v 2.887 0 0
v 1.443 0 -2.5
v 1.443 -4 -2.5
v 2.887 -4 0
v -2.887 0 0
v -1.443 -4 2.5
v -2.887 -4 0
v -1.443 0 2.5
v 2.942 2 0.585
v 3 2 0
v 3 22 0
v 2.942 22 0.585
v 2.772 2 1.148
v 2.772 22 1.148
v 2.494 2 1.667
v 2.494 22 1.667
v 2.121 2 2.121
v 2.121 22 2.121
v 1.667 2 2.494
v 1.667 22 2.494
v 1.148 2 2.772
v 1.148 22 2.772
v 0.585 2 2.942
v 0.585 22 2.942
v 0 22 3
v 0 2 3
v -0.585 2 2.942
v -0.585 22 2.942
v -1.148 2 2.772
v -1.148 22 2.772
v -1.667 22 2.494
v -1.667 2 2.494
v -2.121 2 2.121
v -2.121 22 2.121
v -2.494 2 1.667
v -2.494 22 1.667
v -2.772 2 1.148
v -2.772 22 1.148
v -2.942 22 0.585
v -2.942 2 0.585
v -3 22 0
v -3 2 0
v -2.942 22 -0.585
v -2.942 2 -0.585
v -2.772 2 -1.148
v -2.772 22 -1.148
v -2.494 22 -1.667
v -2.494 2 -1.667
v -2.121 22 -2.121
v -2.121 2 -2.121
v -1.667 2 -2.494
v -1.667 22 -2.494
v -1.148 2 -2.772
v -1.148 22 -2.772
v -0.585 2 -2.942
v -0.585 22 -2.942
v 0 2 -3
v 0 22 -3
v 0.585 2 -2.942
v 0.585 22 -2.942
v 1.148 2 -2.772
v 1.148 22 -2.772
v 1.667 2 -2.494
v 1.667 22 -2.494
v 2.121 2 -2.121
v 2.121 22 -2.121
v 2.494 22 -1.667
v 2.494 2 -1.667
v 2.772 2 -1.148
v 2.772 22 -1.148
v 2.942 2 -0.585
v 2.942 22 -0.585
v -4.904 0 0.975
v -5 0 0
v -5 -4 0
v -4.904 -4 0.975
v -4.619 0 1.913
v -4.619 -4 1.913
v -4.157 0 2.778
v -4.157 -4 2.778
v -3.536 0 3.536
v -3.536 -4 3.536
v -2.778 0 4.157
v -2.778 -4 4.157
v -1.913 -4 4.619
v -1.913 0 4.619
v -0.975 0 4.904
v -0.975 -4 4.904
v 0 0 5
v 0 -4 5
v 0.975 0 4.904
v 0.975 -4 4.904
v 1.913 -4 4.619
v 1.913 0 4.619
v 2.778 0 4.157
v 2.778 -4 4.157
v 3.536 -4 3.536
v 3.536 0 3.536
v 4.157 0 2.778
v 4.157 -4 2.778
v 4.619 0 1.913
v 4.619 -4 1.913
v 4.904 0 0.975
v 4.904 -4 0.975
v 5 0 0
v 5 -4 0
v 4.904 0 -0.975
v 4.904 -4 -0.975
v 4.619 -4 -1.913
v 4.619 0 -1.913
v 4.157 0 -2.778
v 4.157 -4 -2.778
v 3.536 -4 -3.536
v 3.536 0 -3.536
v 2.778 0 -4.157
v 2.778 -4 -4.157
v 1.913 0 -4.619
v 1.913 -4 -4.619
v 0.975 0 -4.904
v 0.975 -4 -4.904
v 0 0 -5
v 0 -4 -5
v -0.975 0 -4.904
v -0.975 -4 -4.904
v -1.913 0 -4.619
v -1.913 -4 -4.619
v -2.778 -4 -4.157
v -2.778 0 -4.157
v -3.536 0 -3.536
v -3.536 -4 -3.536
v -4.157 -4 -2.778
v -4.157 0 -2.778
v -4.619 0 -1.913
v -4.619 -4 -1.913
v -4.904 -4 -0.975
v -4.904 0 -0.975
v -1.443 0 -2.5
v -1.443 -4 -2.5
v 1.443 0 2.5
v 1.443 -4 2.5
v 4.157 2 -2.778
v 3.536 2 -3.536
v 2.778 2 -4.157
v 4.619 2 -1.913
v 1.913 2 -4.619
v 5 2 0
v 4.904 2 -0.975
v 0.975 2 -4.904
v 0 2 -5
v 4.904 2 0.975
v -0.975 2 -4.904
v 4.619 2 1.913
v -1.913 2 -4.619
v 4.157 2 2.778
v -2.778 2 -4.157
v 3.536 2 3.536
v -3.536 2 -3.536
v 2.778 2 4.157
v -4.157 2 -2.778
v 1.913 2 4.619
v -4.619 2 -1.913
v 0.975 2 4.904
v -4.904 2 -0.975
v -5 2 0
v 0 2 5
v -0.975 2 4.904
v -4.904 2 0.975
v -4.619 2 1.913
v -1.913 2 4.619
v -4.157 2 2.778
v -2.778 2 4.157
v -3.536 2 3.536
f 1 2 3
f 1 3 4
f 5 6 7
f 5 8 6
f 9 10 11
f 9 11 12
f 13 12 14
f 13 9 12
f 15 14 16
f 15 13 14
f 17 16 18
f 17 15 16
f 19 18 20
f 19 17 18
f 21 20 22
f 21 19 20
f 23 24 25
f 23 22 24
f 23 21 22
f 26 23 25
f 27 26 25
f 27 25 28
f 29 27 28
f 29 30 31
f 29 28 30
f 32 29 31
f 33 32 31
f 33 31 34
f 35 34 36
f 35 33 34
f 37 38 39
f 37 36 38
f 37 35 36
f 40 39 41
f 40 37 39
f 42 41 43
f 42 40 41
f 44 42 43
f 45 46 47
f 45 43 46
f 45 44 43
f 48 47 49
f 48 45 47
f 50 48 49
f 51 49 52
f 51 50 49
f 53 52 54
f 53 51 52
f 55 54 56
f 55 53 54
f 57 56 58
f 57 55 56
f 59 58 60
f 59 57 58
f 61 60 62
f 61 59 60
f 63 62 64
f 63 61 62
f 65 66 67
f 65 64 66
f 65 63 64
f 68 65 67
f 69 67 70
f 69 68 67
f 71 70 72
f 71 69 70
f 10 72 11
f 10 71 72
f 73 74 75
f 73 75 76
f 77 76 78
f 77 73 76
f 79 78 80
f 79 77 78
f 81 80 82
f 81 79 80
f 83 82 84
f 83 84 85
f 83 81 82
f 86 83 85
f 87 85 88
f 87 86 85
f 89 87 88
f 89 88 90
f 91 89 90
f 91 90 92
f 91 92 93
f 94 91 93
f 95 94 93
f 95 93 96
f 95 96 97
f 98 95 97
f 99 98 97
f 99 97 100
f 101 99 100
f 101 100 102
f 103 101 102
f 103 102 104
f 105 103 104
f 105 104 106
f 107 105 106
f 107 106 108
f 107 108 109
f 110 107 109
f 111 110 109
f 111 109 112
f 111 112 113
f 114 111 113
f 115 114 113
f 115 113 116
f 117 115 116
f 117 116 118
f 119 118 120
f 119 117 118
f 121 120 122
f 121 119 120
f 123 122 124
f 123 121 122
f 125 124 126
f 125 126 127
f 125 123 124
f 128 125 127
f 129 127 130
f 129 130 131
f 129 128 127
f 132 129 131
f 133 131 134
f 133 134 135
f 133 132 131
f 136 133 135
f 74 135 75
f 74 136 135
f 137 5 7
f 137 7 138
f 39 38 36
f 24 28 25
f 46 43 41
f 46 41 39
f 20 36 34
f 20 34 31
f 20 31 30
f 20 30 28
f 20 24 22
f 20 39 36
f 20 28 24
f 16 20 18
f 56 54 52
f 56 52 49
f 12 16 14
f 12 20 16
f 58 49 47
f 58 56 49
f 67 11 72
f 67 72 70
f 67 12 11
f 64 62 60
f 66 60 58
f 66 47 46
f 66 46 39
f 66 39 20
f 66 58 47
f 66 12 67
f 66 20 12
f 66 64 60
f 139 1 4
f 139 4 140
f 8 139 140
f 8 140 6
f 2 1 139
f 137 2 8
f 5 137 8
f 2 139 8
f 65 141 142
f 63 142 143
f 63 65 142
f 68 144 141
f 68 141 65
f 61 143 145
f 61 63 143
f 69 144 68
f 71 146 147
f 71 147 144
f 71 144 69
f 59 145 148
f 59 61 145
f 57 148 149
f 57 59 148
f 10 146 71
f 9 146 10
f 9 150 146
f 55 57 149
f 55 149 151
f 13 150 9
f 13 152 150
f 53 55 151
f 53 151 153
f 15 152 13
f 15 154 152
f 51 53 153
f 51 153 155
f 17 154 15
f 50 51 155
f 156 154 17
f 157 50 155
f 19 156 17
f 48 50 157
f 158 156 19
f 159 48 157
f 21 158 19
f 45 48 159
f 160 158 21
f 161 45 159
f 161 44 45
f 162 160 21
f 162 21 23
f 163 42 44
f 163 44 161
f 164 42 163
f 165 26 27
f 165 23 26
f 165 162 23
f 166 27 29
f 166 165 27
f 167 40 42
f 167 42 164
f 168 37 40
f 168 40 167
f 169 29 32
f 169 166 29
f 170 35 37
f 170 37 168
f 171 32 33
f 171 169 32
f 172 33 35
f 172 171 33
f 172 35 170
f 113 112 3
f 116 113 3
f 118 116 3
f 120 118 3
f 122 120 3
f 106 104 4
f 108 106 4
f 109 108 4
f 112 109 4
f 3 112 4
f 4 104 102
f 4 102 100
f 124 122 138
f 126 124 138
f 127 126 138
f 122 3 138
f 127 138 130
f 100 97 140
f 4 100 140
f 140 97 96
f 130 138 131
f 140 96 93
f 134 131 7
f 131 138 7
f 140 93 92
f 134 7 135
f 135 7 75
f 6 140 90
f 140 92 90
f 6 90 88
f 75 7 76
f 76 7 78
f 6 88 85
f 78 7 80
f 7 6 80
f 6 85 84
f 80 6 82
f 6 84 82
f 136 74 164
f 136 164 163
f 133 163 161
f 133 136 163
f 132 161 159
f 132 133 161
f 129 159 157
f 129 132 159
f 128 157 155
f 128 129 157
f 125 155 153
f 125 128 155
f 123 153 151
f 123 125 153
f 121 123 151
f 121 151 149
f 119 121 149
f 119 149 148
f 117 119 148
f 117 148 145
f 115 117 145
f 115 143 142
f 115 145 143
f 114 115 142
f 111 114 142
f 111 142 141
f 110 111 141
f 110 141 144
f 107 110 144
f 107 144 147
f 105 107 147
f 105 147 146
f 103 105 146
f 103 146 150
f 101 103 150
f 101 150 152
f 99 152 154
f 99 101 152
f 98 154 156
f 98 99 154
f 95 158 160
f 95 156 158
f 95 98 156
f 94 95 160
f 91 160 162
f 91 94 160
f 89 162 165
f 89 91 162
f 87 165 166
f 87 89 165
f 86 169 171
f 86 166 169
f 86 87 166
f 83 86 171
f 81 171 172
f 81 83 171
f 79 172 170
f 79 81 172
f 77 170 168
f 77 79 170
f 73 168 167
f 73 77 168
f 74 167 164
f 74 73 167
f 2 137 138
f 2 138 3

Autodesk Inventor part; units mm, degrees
ref_plane "YZ Plane" through (0, 0, 0) normal (1, 0, 0) x (0, 1, 0)
ref_plane "XZ Plane" through (0, 0, 0) normal (0, 1, 0) x (-1, 0, 0)
ref_plane "XY Plane" through (0, 0, 0) normal (0, 0, 1) x (1, 0, 0)
sketch "Szkic1" plane through (0, 0, 0) normal (0, 1, 0) x (-1, 0, 0)
  circle A0 centre (0, 0) radius 5
  line L0 (1.4434, 2.5) -> (2.8868, 0)
  line L1 (2.8868, 0) -> (1.4434, -2.5)
  line L2 (1.4434, -2.5) -> (-1.4434, -2.5)
  line L3 (-1.4434, -2.5) -> (-2.8868, 0)
  line L4 (-2.8868, 0) -> (-1.4434, 2.5)
  line L5 (-1.4434, 2.5) -> (1.4434, 2.5)
  circle A1 centre (0, 0) radius 3
  dimension "d0" = 10
  dimension "d1" = 5
  dimension "d2" = 6
extrude "Wyciągnięcie proste1" add sketch "Szkic1" along normal blind 2 contours A0 | L0 L1 L2 L3 L4 L5 | A1
extrude "Wyciągnięcie proste2" add sketch "Szkic1" against normal blind 4 contours A0 | A1
sketch "Szkic2" plane through (0, 2, 0) normal (0, 1, 0) x (1, 0, 0)
  circle A0 centre (0, 0) radius 3
  dimension "d7" = 6
extrude "Wyciągnięcie proste3" add sketch "Szkic2" along normal blind 20
thread "Gwint1" size "M6x1" class "6g" standard "ANSI Metric M Profile" length 65
properties part number "M6x20"
